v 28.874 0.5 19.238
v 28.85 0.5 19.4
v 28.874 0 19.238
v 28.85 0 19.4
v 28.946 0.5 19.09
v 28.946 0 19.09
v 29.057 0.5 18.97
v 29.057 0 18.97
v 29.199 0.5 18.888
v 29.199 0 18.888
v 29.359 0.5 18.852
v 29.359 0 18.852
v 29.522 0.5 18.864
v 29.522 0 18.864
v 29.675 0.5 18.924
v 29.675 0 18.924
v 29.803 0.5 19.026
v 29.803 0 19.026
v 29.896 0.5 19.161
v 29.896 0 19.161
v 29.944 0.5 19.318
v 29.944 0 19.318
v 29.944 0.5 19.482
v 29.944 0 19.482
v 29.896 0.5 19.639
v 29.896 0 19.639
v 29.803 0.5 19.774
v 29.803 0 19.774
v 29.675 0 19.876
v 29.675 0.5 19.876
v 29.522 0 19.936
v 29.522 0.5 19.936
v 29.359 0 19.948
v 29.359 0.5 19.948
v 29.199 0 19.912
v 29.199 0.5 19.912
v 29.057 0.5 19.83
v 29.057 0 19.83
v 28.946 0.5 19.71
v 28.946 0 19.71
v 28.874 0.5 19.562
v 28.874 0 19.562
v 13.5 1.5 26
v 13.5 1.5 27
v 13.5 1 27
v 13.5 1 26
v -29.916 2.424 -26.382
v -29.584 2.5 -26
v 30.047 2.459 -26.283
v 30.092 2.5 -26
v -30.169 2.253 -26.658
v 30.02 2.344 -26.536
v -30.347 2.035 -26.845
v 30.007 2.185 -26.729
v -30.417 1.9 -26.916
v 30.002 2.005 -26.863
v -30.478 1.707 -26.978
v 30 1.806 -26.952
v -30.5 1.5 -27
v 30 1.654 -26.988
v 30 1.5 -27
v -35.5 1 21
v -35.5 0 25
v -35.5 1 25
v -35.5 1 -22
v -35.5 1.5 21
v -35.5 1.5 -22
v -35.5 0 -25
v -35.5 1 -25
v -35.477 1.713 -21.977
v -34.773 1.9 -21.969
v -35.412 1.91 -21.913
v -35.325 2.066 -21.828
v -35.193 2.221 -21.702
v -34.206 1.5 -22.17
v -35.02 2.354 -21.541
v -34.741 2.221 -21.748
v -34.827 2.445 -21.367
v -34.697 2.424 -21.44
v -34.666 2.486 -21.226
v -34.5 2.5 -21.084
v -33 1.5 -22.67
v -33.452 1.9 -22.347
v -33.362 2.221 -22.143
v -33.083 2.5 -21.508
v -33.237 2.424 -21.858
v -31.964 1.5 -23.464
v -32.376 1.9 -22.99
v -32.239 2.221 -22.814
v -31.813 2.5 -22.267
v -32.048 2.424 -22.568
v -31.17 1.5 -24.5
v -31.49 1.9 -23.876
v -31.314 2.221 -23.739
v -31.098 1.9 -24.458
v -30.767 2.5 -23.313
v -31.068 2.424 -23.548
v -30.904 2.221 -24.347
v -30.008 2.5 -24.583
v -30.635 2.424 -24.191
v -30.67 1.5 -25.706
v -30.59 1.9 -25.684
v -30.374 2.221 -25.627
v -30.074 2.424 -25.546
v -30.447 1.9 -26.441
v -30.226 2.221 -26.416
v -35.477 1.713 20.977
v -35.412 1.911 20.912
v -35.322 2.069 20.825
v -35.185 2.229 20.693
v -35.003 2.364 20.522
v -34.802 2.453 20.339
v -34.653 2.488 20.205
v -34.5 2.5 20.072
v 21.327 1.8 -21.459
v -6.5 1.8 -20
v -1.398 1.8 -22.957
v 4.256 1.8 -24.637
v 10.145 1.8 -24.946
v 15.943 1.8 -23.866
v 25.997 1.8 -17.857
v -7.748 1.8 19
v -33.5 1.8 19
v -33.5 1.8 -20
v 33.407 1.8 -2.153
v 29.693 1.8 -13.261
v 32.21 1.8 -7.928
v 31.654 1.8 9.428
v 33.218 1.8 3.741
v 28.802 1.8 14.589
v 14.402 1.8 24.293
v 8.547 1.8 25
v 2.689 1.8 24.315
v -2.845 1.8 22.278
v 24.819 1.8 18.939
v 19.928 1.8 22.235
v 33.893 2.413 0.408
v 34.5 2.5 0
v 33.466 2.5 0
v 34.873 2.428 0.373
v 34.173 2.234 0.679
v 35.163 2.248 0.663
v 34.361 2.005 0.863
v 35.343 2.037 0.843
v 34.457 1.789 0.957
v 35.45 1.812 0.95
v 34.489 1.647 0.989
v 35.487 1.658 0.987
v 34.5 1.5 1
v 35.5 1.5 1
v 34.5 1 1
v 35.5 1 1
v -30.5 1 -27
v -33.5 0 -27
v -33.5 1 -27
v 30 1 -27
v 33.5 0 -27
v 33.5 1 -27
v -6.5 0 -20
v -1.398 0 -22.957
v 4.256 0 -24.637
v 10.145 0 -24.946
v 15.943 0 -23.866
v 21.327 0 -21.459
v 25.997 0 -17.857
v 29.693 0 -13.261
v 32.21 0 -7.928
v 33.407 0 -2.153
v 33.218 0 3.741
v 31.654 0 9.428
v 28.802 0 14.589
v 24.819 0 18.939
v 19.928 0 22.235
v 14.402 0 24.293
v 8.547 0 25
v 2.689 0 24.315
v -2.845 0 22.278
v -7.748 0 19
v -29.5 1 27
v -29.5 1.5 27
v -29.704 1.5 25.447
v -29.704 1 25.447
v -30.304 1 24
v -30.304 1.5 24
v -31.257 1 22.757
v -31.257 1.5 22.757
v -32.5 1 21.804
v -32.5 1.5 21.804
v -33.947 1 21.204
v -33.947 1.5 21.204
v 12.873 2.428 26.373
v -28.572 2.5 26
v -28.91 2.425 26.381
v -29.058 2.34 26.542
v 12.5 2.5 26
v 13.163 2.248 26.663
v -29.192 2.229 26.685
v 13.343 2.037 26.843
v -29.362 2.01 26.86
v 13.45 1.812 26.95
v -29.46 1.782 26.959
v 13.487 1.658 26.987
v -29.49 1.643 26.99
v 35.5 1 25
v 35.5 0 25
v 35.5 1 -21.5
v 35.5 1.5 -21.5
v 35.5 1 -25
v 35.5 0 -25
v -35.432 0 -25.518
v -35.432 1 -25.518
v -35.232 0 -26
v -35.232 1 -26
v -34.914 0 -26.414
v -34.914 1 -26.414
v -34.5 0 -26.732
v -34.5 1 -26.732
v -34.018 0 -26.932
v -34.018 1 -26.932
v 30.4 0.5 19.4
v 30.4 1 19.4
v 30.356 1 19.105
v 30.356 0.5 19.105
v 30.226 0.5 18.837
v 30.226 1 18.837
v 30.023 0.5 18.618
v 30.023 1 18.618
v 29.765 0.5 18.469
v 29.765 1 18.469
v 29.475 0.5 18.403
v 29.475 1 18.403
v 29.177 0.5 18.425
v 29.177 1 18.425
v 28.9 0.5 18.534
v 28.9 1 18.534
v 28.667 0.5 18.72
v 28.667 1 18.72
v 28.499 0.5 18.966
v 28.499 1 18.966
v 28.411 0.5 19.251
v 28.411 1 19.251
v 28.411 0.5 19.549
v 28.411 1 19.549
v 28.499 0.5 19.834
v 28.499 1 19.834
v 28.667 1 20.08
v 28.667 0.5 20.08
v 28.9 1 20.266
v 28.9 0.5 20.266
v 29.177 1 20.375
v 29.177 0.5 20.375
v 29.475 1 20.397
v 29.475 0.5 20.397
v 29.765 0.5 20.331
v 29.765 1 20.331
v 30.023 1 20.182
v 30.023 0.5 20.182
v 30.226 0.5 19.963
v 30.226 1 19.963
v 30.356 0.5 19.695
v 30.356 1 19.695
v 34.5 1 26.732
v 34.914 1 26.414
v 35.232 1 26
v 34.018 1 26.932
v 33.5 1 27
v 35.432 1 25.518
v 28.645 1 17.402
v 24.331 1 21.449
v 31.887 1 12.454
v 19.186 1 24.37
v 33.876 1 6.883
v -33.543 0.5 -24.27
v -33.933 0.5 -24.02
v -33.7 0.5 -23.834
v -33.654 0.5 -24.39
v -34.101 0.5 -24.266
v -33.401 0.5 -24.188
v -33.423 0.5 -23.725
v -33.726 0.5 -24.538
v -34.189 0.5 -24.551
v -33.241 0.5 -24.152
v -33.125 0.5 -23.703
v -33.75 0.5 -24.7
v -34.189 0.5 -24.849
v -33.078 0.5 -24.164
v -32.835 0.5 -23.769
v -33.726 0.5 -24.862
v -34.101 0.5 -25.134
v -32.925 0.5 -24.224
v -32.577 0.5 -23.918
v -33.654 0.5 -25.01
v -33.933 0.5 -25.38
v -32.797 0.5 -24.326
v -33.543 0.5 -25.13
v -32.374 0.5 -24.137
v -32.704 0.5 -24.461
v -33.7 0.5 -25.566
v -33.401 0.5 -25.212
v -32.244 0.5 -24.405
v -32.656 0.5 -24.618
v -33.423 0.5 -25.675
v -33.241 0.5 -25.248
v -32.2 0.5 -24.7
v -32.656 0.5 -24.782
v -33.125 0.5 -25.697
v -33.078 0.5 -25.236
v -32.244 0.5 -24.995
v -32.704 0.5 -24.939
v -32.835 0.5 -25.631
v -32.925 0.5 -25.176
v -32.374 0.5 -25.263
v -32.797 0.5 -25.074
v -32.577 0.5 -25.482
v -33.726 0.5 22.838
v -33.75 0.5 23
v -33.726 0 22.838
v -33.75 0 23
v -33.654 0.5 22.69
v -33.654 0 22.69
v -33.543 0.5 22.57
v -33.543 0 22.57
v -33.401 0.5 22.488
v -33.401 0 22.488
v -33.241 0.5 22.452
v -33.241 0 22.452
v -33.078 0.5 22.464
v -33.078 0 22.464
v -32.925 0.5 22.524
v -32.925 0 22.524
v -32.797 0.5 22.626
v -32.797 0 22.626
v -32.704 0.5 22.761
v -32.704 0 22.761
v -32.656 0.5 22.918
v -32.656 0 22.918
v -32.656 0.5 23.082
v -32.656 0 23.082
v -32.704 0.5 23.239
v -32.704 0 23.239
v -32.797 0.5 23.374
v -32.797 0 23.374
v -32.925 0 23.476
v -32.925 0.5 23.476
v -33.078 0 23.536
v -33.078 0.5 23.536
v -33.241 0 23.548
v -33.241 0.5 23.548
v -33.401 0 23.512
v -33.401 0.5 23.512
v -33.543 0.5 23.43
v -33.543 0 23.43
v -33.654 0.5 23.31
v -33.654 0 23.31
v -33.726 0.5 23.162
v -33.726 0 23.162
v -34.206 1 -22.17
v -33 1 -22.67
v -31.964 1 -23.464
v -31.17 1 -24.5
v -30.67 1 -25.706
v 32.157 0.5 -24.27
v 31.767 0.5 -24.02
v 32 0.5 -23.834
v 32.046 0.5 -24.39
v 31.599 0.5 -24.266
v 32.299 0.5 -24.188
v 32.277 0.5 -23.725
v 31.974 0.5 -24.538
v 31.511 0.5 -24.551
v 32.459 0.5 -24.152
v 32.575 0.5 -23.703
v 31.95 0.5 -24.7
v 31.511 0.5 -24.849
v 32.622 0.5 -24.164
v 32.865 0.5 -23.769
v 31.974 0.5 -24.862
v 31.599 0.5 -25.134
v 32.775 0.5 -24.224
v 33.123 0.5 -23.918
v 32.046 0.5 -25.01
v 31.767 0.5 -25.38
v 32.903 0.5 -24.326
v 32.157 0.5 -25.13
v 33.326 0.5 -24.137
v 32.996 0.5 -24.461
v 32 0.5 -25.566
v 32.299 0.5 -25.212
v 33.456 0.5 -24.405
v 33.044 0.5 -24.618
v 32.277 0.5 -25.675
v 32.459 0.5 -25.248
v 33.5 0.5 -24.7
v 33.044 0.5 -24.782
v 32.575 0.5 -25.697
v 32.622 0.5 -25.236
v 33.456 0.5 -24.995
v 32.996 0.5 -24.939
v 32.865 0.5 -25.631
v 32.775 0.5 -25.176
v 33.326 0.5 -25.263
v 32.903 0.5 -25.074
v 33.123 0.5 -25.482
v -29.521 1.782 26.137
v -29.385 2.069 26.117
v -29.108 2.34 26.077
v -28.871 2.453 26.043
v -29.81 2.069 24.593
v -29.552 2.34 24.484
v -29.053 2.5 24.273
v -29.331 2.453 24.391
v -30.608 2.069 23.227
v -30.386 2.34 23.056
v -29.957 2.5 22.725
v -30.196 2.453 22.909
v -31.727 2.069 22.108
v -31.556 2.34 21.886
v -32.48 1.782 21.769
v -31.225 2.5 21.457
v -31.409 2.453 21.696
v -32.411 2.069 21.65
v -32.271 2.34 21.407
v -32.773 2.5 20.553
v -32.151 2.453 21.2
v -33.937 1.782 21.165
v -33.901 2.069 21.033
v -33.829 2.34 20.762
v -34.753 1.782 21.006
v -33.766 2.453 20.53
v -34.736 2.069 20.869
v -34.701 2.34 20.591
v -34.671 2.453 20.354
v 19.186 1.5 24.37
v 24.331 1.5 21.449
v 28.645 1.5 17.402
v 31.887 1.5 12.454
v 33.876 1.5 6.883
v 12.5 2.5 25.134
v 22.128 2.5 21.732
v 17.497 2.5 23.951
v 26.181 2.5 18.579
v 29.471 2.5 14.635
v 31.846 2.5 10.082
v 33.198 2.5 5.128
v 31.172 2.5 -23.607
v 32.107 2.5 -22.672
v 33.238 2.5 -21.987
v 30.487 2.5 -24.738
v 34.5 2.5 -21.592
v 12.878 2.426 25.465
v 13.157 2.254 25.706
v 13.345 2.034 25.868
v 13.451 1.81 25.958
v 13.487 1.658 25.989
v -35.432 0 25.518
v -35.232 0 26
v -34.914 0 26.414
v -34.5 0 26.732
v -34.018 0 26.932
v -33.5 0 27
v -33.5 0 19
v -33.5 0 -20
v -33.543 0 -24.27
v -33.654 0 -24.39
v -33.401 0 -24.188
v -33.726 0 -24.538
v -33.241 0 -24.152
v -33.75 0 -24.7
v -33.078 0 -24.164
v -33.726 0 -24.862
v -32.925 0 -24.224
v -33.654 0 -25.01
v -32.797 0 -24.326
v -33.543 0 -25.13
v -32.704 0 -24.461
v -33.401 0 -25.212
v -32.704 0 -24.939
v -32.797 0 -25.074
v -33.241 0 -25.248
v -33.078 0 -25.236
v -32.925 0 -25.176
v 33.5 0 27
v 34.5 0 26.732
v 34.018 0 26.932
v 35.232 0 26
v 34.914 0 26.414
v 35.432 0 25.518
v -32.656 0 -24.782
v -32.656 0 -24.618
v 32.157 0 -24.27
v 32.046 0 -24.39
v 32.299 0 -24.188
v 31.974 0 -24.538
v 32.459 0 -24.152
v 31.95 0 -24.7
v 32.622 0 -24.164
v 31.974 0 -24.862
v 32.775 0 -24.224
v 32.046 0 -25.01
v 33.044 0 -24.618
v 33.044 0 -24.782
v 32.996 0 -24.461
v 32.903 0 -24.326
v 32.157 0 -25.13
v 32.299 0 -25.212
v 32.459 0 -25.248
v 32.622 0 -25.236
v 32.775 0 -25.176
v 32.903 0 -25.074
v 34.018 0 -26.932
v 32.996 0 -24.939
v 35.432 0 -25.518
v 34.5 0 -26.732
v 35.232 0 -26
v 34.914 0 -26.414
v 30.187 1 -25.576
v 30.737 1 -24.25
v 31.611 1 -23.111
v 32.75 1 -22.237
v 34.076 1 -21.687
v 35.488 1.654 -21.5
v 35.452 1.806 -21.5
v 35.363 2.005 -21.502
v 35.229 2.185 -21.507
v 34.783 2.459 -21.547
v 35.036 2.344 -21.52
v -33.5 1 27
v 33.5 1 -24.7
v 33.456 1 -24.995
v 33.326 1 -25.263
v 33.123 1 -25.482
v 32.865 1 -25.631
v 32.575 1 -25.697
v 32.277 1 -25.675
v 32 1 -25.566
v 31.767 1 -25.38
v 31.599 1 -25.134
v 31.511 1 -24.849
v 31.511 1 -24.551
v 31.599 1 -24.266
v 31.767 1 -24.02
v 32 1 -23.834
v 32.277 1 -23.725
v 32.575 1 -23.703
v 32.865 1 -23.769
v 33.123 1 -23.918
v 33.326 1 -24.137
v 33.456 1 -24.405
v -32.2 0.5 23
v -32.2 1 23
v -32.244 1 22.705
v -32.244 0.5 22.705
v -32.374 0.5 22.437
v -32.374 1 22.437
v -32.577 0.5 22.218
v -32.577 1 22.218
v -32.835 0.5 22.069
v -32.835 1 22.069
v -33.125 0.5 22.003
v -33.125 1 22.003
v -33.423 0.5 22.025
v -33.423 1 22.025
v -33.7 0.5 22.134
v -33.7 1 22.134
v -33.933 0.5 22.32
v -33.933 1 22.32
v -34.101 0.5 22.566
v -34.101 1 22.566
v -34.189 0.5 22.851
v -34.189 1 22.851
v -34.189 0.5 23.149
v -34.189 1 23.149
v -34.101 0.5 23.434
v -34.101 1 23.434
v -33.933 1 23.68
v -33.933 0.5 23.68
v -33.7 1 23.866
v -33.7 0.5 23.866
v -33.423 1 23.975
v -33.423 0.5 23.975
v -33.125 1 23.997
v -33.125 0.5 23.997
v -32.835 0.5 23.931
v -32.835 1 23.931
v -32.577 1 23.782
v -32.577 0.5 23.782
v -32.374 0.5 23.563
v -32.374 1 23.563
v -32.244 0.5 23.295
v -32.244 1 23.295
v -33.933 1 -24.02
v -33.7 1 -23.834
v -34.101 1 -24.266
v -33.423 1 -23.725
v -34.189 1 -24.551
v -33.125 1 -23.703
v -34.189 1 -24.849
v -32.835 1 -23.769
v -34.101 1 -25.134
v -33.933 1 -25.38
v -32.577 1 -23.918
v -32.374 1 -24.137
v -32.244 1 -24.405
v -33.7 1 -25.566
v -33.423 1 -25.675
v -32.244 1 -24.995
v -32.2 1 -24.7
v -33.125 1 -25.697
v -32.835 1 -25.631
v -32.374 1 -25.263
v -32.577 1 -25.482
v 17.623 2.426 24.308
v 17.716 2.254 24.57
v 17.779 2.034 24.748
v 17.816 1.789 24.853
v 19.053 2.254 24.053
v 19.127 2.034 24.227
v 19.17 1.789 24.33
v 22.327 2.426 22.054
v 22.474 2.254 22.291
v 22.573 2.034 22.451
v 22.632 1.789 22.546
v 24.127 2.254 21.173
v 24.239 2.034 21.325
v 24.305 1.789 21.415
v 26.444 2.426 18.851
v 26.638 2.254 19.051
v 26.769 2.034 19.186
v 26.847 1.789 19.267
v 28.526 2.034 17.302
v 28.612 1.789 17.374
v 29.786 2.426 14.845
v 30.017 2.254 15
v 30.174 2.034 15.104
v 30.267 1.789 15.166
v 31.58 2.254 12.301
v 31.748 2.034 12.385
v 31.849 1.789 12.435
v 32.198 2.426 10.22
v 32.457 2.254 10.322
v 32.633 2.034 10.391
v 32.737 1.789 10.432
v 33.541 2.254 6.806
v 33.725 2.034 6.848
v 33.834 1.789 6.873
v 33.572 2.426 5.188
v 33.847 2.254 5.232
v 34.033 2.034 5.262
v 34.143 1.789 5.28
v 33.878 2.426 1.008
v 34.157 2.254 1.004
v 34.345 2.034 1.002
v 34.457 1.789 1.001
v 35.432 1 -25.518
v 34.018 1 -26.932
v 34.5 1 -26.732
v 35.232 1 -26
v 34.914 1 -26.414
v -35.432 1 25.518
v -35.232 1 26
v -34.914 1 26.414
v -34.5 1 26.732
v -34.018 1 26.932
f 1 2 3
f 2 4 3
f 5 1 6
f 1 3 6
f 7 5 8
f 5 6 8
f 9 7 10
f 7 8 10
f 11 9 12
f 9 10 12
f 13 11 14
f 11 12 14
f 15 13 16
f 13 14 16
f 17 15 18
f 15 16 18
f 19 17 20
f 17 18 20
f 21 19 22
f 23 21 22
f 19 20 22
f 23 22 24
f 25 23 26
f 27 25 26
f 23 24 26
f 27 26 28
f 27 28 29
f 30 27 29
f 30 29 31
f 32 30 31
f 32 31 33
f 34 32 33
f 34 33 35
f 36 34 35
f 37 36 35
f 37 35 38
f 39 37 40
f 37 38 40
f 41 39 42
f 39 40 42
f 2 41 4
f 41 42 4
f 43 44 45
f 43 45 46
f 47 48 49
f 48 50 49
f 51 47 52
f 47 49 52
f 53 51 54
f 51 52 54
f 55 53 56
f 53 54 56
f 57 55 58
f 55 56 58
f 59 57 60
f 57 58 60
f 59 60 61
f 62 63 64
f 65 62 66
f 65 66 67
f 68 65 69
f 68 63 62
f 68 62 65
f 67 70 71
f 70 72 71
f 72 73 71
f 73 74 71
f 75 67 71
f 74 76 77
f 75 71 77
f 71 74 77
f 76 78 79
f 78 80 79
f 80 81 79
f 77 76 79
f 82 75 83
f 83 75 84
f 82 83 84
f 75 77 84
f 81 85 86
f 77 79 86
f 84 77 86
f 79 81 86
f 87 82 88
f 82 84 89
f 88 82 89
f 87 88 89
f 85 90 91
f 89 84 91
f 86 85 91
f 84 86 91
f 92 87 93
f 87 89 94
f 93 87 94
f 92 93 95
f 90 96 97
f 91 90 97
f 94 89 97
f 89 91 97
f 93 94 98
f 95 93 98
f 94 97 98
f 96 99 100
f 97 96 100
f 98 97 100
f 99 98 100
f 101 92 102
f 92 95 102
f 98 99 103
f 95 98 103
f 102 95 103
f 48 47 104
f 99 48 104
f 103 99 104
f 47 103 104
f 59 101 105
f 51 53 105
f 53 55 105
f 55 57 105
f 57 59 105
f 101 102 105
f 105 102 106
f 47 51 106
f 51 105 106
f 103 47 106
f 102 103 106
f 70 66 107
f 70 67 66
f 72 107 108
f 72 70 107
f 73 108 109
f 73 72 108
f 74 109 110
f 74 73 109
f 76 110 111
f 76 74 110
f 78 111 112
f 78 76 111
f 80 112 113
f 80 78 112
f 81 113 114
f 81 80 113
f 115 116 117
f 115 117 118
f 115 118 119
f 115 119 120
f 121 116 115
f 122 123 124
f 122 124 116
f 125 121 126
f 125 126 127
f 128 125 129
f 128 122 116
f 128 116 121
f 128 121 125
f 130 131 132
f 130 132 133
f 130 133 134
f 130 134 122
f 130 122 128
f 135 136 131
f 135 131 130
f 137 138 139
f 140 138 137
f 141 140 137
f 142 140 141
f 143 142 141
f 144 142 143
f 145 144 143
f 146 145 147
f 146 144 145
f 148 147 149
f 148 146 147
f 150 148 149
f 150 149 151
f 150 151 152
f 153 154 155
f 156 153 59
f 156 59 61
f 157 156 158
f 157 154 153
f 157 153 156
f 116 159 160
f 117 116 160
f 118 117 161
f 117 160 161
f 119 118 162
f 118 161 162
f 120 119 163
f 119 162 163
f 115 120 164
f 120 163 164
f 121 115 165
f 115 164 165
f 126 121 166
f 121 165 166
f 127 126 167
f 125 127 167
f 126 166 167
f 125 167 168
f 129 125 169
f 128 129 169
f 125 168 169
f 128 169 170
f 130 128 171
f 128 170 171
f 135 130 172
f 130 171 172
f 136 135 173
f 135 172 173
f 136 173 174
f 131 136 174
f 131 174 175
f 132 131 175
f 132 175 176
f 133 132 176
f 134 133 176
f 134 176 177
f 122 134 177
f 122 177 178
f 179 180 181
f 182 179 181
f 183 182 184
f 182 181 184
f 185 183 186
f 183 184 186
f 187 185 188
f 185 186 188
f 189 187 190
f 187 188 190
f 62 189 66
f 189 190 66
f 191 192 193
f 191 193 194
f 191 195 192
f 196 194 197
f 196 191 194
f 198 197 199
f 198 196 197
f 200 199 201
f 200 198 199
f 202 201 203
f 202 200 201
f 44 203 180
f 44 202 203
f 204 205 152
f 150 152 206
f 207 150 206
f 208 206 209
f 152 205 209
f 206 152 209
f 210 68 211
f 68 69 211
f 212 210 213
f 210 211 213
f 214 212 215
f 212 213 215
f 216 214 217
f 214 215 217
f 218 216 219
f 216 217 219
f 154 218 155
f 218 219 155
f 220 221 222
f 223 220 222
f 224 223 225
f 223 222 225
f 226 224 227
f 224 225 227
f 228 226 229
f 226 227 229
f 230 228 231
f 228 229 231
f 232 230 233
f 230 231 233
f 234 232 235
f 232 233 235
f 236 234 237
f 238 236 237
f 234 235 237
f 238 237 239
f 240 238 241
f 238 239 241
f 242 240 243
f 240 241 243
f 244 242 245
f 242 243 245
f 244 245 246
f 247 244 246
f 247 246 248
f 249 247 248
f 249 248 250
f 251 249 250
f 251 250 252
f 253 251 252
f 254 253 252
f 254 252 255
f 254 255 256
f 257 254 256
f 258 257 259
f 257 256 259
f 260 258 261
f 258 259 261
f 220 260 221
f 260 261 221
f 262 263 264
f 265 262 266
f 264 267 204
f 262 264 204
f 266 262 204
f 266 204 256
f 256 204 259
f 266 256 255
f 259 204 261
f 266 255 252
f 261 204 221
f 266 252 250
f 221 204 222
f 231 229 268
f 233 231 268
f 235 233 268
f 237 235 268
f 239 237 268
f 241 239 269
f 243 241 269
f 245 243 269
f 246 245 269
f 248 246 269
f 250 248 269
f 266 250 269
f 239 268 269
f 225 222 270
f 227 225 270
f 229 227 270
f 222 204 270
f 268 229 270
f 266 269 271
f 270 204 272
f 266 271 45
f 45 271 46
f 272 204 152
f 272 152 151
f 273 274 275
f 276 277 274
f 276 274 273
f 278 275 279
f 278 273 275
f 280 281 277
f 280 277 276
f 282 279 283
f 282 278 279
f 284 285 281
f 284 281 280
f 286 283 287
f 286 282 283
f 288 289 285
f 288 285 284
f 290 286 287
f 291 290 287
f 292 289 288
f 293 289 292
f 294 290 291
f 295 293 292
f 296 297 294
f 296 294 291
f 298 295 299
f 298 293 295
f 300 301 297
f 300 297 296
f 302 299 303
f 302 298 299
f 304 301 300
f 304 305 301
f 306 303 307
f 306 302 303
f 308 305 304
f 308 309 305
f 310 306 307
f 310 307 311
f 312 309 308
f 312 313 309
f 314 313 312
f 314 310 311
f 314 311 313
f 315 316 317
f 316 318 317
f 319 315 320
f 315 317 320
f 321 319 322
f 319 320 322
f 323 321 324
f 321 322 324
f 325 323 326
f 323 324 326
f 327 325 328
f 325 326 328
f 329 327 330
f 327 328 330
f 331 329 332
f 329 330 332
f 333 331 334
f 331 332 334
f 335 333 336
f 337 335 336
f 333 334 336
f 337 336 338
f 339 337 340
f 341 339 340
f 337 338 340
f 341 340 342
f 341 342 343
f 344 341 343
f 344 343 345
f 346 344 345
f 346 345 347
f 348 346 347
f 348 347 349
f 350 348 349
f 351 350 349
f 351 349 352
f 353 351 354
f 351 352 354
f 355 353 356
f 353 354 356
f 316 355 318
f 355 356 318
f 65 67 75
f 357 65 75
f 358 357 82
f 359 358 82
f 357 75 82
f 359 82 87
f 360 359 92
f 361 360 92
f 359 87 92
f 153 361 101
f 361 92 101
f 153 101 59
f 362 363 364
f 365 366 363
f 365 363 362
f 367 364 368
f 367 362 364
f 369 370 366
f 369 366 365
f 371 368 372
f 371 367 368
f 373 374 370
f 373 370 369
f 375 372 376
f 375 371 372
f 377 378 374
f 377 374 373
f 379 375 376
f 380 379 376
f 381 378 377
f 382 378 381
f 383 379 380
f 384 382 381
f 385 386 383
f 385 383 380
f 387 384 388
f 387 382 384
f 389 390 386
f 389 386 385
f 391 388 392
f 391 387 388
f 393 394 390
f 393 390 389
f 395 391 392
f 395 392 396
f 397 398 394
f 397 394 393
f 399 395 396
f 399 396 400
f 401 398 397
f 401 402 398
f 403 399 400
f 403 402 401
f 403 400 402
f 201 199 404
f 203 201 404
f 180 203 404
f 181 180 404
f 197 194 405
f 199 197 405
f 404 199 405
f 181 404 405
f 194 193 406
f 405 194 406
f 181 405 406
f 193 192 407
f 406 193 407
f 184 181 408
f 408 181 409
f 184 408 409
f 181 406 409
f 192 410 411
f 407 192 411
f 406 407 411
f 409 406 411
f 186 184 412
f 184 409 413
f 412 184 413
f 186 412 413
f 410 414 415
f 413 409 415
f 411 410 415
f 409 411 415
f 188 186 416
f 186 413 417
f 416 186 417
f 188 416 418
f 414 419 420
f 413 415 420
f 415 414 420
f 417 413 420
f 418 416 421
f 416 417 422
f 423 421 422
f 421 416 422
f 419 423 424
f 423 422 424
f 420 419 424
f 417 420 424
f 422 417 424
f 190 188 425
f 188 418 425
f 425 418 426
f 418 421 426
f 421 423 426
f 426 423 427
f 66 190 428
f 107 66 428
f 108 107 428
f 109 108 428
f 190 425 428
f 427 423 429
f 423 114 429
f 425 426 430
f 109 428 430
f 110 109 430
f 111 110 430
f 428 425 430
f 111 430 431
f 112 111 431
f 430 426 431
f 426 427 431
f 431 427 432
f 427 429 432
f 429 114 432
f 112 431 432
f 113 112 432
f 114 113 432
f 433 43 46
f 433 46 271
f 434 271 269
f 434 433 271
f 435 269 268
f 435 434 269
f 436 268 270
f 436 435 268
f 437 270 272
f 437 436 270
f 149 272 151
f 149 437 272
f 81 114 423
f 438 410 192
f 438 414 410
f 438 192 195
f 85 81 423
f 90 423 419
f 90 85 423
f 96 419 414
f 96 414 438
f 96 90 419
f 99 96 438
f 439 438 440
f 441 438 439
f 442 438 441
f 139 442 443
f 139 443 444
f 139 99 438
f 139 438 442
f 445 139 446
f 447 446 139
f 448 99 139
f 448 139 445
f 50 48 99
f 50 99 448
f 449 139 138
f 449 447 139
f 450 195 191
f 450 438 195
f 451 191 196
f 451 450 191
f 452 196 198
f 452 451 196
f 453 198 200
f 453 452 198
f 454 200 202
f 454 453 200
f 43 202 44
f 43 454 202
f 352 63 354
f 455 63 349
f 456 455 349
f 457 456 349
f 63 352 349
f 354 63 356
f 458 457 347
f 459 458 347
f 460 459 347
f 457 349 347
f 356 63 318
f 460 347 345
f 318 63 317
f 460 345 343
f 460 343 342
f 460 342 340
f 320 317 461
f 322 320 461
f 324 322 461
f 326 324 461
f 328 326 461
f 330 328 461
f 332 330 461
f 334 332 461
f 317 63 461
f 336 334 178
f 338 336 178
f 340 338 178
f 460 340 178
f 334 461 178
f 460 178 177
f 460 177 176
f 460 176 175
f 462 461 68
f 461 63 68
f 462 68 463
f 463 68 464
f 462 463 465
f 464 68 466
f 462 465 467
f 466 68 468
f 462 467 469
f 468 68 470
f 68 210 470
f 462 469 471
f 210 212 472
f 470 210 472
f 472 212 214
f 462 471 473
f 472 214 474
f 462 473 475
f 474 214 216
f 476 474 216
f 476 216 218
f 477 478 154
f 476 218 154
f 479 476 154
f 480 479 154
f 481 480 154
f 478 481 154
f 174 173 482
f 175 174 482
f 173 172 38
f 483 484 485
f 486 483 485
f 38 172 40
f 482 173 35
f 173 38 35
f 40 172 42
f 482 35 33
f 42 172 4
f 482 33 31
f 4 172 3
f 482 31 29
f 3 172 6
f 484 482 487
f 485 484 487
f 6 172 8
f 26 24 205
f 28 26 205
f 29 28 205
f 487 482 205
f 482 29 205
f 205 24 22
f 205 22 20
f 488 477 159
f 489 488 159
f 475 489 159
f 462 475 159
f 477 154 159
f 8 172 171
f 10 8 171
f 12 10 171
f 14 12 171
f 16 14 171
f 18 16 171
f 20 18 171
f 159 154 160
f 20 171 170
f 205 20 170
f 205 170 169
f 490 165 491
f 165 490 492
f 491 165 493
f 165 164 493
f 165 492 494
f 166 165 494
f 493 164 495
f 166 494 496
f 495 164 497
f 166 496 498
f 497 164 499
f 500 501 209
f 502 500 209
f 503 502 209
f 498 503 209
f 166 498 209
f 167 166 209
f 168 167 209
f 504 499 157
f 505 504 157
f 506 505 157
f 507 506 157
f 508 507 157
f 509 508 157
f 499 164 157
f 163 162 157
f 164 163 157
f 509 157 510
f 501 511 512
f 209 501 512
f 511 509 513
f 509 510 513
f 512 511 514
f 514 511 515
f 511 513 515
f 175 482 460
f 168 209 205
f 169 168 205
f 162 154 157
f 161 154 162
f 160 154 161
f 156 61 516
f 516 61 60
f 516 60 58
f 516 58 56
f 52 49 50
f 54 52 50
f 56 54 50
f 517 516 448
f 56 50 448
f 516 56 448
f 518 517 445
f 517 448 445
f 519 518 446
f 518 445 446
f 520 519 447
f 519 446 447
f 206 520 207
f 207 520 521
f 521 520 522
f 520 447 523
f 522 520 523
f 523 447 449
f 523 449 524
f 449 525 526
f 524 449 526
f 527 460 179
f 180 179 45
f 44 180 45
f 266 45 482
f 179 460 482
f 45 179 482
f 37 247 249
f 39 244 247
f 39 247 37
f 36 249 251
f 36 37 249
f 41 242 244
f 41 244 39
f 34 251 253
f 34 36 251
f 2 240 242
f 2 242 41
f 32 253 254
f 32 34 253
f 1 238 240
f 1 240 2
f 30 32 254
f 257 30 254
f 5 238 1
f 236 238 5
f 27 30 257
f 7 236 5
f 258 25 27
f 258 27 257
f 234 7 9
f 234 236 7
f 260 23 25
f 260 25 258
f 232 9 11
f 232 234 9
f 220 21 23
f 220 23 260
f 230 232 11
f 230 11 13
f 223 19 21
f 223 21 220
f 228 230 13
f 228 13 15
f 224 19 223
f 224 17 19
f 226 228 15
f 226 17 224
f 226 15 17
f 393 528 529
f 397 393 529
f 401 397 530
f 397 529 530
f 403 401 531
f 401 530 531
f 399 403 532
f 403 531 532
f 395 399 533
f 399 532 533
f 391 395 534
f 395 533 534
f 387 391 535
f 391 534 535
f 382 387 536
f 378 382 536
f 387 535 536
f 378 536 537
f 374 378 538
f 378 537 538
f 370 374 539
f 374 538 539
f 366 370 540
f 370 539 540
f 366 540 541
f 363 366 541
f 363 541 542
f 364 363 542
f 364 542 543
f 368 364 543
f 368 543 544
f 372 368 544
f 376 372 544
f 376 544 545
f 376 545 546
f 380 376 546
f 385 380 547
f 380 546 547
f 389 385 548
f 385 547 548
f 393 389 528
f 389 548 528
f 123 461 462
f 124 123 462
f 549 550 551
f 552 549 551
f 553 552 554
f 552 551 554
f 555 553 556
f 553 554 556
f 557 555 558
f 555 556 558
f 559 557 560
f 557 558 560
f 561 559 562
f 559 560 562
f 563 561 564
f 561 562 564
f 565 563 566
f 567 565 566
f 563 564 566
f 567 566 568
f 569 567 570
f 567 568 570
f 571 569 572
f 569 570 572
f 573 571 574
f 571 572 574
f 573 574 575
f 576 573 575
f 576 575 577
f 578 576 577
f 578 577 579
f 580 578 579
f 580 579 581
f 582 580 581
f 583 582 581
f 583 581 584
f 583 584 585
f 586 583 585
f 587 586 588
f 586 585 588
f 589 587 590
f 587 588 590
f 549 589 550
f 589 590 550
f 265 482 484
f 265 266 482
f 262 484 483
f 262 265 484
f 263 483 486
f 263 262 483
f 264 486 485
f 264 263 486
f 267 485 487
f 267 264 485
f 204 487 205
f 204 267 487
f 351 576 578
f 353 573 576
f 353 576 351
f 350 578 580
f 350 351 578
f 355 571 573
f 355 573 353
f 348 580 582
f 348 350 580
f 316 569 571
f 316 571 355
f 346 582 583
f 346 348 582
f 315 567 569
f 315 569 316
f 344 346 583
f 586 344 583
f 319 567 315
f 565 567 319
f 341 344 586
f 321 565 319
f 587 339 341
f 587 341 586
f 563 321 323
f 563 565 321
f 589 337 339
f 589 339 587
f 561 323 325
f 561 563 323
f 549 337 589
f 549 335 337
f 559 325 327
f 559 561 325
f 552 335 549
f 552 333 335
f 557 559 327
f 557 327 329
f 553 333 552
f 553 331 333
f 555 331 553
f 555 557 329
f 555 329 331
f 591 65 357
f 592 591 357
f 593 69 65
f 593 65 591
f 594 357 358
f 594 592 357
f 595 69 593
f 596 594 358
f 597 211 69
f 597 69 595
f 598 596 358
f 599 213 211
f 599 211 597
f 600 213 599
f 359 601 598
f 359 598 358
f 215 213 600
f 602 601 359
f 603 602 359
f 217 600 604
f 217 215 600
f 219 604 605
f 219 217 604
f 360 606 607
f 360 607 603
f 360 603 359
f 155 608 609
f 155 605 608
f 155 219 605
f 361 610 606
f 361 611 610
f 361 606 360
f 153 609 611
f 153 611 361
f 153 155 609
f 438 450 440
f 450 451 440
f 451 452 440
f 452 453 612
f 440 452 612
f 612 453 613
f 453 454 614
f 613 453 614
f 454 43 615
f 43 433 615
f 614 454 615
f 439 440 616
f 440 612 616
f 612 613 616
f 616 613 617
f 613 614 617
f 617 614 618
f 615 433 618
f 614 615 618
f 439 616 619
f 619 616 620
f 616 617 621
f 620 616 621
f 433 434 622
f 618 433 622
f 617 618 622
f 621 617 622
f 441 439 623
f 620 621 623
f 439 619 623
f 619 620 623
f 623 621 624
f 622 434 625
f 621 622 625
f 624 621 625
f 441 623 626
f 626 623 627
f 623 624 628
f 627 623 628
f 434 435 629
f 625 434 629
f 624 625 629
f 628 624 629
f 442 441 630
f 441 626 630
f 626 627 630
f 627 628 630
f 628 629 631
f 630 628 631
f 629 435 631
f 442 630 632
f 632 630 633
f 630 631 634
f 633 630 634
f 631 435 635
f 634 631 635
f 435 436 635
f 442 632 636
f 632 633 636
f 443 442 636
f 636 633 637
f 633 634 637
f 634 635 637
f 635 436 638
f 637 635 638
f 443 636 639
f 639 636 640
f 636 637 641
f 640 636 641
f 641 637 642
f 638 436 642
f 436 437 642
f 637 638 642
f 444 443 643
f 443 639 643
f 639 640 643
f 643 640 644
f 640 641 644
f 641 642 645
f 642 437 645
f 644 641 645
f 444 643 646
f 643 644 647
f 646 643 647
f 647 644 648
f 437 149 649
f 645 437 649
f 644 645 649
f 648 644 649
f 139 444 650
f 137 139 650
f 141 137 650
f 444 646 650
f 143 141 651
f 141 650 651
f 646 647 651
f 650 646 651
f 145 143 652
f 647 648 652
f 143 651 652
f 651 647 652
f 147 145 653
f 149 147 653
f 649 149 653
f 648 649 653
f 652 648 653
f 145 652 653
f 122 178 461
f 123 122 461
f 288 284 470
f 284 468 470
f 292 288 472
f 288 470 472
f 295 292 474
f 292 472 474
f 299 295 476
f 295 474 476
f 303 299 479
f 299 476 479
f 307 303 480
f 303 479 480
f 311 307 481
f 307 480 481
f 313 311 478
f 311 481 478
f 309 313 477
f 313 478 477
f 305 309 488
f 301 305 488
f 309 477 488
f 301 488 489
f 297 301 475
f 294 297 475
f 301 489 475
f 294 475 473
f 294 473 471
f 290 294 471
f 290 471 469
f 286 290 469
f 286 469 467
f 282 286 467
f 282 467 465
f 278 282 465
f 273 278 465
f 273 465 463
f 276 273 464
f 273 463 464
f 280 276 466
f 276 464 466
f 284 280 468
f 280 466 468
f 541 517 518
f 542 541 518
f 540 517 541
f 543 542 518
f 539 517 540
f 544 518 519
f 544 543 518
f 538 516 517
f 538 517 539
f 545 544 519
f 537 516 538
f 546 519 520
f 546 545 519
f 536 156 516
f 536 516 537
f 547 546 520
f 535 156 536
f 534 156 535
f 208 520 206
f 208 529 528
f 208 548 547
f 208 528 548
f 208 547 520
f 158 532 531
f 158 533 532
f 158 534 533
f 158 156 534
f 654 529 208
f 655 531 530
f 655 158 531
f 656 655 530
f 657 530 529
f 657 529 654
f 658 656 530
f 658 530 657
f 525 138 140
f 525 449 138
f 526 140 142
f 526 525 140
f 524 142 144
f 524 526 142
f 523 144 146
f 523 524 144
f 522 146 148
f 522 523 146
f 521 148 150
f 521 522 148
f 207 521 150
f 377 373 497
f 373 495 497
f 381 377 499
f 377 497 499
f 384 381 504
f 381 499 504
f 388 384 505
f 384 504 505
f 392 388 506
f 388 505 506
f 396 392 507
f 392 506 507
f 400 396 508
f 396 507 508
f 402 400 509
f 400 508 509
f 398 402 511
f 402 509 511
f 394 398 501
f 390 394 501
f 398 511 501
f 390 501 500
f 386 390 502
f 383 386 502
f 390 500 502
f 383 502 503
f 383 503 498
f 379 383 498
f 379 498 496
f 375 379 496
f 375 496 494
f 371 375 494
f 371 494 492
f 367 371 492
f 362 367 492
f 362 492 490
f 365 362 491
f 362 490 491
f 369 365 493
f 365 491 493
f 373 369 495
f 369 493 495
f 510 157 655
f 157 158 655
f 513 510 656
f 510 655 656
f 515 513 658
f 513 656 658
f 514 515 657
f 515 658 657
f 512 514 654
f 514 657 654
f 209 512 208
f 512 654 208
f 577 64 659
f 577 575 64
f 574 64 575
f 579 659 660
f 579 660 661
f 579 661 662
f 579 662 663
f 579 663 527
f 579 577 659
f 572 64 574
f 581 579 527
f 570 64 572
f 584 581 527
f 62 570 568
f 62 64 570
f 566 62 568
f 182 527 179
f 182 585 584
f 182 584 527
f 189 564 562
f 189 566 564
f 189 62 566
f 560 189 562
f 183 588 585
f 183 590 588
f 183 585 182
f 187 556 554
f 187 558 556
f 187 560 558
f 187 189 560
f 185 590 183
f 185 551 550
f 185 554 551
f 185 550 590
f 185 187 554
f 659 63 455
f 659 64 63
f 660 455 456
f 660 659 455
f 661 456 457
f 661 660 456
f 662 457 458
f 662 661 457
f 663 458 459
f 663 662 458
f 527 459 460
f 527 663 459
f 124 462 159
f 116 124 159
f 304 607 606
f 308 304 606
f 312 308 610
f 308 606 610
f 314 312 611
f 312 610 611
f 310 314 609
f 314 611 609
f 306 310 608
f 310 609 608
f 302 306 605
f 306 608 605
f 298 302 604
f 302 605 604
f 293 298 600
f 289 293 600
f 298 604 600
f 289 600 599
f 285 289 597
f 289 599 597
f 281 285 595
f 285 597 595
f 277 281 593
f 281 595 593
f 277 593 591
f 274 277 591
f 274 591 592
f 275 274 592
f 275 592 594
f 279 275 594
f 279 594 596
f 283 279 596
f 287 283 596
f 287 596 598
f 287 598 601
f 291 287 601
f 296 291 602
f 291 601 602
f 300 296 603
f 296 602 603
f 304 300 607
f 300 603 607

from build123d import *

# Parameters (mm, degrees)
SKETCH1_W                         = 71
SKETCH1_H                         = 54
BOSS_EXTRUDE1_DEPTH               = 2.5
M1_4X0_3_TAPPED_HOLE1_D           = 1.1
M1_4X0_3_TAPPED_HOLE1_CSINK_D     = 1.45
M1_4X0_3_TAPPED_HOLE1_CSINK_ANGLE = 90
CUT_EXTRUDE1_DEPTH                = 1.8
SKETCH5_R                         = 6
SKETCH5_R_2                       = 5
SKETCH5_R_3                       = 5.5
CUT_EXTRUDE2_DEPTH                = 1.5
FILLET1_R                         = 2
FILLET2_R                         = 1
SKETCH6_R                         = 1
CUT_EXTRUDE4_DEPTH                = 0.5


with BuildPart() as part:
    # Sketch1 → Boss-Extrude1 (new body)
    with BuildSketch(Plane(origin=(0, 0, 0), x_dir=(1, 0, 0), z_dir=(0, 1, 0))):
        Rectangle(SKETCH1_W, SKETCH1_H)
    extrude(amount=BOSS_EXTRUDE1_DEPTH)

    # M1.4x0.3 Tapped Hole1 (through all)
    with Locations(Plane(origin=(0, 2.5, 0), x_dir=(1, 0, 0), z_dir=(0, 1, 0))):
        with Locations((-33.2, 24.7), (32.5, 24.7), (-33.2, -23), (29.4, -19.4)):
            CounterSinkHole(M1_4X0_3_TAPPED_HOLE1_D / 2, M1_4X0_3_TAPPED_HOLE1_CSINK_D / 2, counter_sink_angle=M1_4X0_3_TAPPED_HOLE1_CSINK_ANGLE)

    # Sketch4 → Cut-Extrude1 (cut)
    with BuildSketch(Plane.XZ):
        with BuildLine():
            Line((-7.748076809, 19), (-33.5, 19))
            Line((-33.5, 19), (-33.5, -20))
            Line((-33.5, -20), (-6.5, -20))
            ThreePointArc((-6.5, -20), (33.487208249, 0.799639875), (-7.748076809, 19))
        make_face()
    extrude(amount=-CUT_EXTRUDE1_DEPTH, mode=Mode.SUBTRACT)

    # Sketch5 → Cut-Extrude2 (cut)
    with BuildSketch(Plane(origin=(0, 2.5, 0), x_dir=(1, 0, 0), z_dir=(0, 1, 0))):
        with Locations((-35.5, -27)):
            Circle(SKETCH5_R)
        with Locations((-35.5, 27)):
            Circle(SKETCH5_R_2)
        with Locations((35.5, 27)):
            Circle(SKETCH5_R_3)
        with BuildLine():
            Line((34.5, -1), (35.5, -1))
            Line((35.5, -1), (35.5, -27))
            Line((35.5, -27), (13.5, -27))
            Line((13.5, -27), (13.5, -26))
            ThreePointArc((13.5, -26), (28.644692027, -17.401541303), (34.5, -1))
        make_face()
    extrude(amount=-CUT_EXTRUDE2_DEPTH, mode=Mode.SUBTRACT)

    # Fillet1
    fillet1_edges = [part.edges().sort_by_distance(p)[0] for p in [
        (35.5, 0.5, 27),
        (-35.5, 0.5, 27),
        (-35.5, 0.5, -27),
        (35.5, 0.5, -27),
    ]]
    fillet(fillet1_edges, radius=FILLET1_R)

    # Fillet2
    fillet2_edges = [part.edges().sort_by_distance(p)[0] for p in [
        (-8, 2.5, 27),
        (-35.5, 2.5, -0.5),
        (-0.25, 2.5, -27),
        (35.5, 2.5, -10.25),
        (28.644692027, 2.5, 17.401541303),
        (13.5, 2.5, 26.5),
        (35, 2.5, 1),
        (-31.964466094, 2.5, -23.464466094),
        (-31.257359313, 2.5, 22.757359313),
    ]]
    fillet(fillet2_edges, radius=FILLET2_R)

    # Sketch6 → Cut-Extrude4 (cut)
    with BuildSketch(Plane(origin=(0, 1, 0), x_dir=(1, 0, 0), z_dir=(0, 1, 0))):
        with Locations((-33.2, 24.7)):
            Circle(SKETCH6_R)
        with Locations((32.5, 24.7)):
            Circle(SKETCH6_R)
        with Locations((29.4, -19.4)):
            Circle(SKETCH6_R)
        with Locations((-33.2, -23)):
            Circle(SKETCH6_R)
    extrude(amount=-CUT_EXTRUDE4_DEPTH, mode=Mode.SUBTRACT)


solid = part.part
